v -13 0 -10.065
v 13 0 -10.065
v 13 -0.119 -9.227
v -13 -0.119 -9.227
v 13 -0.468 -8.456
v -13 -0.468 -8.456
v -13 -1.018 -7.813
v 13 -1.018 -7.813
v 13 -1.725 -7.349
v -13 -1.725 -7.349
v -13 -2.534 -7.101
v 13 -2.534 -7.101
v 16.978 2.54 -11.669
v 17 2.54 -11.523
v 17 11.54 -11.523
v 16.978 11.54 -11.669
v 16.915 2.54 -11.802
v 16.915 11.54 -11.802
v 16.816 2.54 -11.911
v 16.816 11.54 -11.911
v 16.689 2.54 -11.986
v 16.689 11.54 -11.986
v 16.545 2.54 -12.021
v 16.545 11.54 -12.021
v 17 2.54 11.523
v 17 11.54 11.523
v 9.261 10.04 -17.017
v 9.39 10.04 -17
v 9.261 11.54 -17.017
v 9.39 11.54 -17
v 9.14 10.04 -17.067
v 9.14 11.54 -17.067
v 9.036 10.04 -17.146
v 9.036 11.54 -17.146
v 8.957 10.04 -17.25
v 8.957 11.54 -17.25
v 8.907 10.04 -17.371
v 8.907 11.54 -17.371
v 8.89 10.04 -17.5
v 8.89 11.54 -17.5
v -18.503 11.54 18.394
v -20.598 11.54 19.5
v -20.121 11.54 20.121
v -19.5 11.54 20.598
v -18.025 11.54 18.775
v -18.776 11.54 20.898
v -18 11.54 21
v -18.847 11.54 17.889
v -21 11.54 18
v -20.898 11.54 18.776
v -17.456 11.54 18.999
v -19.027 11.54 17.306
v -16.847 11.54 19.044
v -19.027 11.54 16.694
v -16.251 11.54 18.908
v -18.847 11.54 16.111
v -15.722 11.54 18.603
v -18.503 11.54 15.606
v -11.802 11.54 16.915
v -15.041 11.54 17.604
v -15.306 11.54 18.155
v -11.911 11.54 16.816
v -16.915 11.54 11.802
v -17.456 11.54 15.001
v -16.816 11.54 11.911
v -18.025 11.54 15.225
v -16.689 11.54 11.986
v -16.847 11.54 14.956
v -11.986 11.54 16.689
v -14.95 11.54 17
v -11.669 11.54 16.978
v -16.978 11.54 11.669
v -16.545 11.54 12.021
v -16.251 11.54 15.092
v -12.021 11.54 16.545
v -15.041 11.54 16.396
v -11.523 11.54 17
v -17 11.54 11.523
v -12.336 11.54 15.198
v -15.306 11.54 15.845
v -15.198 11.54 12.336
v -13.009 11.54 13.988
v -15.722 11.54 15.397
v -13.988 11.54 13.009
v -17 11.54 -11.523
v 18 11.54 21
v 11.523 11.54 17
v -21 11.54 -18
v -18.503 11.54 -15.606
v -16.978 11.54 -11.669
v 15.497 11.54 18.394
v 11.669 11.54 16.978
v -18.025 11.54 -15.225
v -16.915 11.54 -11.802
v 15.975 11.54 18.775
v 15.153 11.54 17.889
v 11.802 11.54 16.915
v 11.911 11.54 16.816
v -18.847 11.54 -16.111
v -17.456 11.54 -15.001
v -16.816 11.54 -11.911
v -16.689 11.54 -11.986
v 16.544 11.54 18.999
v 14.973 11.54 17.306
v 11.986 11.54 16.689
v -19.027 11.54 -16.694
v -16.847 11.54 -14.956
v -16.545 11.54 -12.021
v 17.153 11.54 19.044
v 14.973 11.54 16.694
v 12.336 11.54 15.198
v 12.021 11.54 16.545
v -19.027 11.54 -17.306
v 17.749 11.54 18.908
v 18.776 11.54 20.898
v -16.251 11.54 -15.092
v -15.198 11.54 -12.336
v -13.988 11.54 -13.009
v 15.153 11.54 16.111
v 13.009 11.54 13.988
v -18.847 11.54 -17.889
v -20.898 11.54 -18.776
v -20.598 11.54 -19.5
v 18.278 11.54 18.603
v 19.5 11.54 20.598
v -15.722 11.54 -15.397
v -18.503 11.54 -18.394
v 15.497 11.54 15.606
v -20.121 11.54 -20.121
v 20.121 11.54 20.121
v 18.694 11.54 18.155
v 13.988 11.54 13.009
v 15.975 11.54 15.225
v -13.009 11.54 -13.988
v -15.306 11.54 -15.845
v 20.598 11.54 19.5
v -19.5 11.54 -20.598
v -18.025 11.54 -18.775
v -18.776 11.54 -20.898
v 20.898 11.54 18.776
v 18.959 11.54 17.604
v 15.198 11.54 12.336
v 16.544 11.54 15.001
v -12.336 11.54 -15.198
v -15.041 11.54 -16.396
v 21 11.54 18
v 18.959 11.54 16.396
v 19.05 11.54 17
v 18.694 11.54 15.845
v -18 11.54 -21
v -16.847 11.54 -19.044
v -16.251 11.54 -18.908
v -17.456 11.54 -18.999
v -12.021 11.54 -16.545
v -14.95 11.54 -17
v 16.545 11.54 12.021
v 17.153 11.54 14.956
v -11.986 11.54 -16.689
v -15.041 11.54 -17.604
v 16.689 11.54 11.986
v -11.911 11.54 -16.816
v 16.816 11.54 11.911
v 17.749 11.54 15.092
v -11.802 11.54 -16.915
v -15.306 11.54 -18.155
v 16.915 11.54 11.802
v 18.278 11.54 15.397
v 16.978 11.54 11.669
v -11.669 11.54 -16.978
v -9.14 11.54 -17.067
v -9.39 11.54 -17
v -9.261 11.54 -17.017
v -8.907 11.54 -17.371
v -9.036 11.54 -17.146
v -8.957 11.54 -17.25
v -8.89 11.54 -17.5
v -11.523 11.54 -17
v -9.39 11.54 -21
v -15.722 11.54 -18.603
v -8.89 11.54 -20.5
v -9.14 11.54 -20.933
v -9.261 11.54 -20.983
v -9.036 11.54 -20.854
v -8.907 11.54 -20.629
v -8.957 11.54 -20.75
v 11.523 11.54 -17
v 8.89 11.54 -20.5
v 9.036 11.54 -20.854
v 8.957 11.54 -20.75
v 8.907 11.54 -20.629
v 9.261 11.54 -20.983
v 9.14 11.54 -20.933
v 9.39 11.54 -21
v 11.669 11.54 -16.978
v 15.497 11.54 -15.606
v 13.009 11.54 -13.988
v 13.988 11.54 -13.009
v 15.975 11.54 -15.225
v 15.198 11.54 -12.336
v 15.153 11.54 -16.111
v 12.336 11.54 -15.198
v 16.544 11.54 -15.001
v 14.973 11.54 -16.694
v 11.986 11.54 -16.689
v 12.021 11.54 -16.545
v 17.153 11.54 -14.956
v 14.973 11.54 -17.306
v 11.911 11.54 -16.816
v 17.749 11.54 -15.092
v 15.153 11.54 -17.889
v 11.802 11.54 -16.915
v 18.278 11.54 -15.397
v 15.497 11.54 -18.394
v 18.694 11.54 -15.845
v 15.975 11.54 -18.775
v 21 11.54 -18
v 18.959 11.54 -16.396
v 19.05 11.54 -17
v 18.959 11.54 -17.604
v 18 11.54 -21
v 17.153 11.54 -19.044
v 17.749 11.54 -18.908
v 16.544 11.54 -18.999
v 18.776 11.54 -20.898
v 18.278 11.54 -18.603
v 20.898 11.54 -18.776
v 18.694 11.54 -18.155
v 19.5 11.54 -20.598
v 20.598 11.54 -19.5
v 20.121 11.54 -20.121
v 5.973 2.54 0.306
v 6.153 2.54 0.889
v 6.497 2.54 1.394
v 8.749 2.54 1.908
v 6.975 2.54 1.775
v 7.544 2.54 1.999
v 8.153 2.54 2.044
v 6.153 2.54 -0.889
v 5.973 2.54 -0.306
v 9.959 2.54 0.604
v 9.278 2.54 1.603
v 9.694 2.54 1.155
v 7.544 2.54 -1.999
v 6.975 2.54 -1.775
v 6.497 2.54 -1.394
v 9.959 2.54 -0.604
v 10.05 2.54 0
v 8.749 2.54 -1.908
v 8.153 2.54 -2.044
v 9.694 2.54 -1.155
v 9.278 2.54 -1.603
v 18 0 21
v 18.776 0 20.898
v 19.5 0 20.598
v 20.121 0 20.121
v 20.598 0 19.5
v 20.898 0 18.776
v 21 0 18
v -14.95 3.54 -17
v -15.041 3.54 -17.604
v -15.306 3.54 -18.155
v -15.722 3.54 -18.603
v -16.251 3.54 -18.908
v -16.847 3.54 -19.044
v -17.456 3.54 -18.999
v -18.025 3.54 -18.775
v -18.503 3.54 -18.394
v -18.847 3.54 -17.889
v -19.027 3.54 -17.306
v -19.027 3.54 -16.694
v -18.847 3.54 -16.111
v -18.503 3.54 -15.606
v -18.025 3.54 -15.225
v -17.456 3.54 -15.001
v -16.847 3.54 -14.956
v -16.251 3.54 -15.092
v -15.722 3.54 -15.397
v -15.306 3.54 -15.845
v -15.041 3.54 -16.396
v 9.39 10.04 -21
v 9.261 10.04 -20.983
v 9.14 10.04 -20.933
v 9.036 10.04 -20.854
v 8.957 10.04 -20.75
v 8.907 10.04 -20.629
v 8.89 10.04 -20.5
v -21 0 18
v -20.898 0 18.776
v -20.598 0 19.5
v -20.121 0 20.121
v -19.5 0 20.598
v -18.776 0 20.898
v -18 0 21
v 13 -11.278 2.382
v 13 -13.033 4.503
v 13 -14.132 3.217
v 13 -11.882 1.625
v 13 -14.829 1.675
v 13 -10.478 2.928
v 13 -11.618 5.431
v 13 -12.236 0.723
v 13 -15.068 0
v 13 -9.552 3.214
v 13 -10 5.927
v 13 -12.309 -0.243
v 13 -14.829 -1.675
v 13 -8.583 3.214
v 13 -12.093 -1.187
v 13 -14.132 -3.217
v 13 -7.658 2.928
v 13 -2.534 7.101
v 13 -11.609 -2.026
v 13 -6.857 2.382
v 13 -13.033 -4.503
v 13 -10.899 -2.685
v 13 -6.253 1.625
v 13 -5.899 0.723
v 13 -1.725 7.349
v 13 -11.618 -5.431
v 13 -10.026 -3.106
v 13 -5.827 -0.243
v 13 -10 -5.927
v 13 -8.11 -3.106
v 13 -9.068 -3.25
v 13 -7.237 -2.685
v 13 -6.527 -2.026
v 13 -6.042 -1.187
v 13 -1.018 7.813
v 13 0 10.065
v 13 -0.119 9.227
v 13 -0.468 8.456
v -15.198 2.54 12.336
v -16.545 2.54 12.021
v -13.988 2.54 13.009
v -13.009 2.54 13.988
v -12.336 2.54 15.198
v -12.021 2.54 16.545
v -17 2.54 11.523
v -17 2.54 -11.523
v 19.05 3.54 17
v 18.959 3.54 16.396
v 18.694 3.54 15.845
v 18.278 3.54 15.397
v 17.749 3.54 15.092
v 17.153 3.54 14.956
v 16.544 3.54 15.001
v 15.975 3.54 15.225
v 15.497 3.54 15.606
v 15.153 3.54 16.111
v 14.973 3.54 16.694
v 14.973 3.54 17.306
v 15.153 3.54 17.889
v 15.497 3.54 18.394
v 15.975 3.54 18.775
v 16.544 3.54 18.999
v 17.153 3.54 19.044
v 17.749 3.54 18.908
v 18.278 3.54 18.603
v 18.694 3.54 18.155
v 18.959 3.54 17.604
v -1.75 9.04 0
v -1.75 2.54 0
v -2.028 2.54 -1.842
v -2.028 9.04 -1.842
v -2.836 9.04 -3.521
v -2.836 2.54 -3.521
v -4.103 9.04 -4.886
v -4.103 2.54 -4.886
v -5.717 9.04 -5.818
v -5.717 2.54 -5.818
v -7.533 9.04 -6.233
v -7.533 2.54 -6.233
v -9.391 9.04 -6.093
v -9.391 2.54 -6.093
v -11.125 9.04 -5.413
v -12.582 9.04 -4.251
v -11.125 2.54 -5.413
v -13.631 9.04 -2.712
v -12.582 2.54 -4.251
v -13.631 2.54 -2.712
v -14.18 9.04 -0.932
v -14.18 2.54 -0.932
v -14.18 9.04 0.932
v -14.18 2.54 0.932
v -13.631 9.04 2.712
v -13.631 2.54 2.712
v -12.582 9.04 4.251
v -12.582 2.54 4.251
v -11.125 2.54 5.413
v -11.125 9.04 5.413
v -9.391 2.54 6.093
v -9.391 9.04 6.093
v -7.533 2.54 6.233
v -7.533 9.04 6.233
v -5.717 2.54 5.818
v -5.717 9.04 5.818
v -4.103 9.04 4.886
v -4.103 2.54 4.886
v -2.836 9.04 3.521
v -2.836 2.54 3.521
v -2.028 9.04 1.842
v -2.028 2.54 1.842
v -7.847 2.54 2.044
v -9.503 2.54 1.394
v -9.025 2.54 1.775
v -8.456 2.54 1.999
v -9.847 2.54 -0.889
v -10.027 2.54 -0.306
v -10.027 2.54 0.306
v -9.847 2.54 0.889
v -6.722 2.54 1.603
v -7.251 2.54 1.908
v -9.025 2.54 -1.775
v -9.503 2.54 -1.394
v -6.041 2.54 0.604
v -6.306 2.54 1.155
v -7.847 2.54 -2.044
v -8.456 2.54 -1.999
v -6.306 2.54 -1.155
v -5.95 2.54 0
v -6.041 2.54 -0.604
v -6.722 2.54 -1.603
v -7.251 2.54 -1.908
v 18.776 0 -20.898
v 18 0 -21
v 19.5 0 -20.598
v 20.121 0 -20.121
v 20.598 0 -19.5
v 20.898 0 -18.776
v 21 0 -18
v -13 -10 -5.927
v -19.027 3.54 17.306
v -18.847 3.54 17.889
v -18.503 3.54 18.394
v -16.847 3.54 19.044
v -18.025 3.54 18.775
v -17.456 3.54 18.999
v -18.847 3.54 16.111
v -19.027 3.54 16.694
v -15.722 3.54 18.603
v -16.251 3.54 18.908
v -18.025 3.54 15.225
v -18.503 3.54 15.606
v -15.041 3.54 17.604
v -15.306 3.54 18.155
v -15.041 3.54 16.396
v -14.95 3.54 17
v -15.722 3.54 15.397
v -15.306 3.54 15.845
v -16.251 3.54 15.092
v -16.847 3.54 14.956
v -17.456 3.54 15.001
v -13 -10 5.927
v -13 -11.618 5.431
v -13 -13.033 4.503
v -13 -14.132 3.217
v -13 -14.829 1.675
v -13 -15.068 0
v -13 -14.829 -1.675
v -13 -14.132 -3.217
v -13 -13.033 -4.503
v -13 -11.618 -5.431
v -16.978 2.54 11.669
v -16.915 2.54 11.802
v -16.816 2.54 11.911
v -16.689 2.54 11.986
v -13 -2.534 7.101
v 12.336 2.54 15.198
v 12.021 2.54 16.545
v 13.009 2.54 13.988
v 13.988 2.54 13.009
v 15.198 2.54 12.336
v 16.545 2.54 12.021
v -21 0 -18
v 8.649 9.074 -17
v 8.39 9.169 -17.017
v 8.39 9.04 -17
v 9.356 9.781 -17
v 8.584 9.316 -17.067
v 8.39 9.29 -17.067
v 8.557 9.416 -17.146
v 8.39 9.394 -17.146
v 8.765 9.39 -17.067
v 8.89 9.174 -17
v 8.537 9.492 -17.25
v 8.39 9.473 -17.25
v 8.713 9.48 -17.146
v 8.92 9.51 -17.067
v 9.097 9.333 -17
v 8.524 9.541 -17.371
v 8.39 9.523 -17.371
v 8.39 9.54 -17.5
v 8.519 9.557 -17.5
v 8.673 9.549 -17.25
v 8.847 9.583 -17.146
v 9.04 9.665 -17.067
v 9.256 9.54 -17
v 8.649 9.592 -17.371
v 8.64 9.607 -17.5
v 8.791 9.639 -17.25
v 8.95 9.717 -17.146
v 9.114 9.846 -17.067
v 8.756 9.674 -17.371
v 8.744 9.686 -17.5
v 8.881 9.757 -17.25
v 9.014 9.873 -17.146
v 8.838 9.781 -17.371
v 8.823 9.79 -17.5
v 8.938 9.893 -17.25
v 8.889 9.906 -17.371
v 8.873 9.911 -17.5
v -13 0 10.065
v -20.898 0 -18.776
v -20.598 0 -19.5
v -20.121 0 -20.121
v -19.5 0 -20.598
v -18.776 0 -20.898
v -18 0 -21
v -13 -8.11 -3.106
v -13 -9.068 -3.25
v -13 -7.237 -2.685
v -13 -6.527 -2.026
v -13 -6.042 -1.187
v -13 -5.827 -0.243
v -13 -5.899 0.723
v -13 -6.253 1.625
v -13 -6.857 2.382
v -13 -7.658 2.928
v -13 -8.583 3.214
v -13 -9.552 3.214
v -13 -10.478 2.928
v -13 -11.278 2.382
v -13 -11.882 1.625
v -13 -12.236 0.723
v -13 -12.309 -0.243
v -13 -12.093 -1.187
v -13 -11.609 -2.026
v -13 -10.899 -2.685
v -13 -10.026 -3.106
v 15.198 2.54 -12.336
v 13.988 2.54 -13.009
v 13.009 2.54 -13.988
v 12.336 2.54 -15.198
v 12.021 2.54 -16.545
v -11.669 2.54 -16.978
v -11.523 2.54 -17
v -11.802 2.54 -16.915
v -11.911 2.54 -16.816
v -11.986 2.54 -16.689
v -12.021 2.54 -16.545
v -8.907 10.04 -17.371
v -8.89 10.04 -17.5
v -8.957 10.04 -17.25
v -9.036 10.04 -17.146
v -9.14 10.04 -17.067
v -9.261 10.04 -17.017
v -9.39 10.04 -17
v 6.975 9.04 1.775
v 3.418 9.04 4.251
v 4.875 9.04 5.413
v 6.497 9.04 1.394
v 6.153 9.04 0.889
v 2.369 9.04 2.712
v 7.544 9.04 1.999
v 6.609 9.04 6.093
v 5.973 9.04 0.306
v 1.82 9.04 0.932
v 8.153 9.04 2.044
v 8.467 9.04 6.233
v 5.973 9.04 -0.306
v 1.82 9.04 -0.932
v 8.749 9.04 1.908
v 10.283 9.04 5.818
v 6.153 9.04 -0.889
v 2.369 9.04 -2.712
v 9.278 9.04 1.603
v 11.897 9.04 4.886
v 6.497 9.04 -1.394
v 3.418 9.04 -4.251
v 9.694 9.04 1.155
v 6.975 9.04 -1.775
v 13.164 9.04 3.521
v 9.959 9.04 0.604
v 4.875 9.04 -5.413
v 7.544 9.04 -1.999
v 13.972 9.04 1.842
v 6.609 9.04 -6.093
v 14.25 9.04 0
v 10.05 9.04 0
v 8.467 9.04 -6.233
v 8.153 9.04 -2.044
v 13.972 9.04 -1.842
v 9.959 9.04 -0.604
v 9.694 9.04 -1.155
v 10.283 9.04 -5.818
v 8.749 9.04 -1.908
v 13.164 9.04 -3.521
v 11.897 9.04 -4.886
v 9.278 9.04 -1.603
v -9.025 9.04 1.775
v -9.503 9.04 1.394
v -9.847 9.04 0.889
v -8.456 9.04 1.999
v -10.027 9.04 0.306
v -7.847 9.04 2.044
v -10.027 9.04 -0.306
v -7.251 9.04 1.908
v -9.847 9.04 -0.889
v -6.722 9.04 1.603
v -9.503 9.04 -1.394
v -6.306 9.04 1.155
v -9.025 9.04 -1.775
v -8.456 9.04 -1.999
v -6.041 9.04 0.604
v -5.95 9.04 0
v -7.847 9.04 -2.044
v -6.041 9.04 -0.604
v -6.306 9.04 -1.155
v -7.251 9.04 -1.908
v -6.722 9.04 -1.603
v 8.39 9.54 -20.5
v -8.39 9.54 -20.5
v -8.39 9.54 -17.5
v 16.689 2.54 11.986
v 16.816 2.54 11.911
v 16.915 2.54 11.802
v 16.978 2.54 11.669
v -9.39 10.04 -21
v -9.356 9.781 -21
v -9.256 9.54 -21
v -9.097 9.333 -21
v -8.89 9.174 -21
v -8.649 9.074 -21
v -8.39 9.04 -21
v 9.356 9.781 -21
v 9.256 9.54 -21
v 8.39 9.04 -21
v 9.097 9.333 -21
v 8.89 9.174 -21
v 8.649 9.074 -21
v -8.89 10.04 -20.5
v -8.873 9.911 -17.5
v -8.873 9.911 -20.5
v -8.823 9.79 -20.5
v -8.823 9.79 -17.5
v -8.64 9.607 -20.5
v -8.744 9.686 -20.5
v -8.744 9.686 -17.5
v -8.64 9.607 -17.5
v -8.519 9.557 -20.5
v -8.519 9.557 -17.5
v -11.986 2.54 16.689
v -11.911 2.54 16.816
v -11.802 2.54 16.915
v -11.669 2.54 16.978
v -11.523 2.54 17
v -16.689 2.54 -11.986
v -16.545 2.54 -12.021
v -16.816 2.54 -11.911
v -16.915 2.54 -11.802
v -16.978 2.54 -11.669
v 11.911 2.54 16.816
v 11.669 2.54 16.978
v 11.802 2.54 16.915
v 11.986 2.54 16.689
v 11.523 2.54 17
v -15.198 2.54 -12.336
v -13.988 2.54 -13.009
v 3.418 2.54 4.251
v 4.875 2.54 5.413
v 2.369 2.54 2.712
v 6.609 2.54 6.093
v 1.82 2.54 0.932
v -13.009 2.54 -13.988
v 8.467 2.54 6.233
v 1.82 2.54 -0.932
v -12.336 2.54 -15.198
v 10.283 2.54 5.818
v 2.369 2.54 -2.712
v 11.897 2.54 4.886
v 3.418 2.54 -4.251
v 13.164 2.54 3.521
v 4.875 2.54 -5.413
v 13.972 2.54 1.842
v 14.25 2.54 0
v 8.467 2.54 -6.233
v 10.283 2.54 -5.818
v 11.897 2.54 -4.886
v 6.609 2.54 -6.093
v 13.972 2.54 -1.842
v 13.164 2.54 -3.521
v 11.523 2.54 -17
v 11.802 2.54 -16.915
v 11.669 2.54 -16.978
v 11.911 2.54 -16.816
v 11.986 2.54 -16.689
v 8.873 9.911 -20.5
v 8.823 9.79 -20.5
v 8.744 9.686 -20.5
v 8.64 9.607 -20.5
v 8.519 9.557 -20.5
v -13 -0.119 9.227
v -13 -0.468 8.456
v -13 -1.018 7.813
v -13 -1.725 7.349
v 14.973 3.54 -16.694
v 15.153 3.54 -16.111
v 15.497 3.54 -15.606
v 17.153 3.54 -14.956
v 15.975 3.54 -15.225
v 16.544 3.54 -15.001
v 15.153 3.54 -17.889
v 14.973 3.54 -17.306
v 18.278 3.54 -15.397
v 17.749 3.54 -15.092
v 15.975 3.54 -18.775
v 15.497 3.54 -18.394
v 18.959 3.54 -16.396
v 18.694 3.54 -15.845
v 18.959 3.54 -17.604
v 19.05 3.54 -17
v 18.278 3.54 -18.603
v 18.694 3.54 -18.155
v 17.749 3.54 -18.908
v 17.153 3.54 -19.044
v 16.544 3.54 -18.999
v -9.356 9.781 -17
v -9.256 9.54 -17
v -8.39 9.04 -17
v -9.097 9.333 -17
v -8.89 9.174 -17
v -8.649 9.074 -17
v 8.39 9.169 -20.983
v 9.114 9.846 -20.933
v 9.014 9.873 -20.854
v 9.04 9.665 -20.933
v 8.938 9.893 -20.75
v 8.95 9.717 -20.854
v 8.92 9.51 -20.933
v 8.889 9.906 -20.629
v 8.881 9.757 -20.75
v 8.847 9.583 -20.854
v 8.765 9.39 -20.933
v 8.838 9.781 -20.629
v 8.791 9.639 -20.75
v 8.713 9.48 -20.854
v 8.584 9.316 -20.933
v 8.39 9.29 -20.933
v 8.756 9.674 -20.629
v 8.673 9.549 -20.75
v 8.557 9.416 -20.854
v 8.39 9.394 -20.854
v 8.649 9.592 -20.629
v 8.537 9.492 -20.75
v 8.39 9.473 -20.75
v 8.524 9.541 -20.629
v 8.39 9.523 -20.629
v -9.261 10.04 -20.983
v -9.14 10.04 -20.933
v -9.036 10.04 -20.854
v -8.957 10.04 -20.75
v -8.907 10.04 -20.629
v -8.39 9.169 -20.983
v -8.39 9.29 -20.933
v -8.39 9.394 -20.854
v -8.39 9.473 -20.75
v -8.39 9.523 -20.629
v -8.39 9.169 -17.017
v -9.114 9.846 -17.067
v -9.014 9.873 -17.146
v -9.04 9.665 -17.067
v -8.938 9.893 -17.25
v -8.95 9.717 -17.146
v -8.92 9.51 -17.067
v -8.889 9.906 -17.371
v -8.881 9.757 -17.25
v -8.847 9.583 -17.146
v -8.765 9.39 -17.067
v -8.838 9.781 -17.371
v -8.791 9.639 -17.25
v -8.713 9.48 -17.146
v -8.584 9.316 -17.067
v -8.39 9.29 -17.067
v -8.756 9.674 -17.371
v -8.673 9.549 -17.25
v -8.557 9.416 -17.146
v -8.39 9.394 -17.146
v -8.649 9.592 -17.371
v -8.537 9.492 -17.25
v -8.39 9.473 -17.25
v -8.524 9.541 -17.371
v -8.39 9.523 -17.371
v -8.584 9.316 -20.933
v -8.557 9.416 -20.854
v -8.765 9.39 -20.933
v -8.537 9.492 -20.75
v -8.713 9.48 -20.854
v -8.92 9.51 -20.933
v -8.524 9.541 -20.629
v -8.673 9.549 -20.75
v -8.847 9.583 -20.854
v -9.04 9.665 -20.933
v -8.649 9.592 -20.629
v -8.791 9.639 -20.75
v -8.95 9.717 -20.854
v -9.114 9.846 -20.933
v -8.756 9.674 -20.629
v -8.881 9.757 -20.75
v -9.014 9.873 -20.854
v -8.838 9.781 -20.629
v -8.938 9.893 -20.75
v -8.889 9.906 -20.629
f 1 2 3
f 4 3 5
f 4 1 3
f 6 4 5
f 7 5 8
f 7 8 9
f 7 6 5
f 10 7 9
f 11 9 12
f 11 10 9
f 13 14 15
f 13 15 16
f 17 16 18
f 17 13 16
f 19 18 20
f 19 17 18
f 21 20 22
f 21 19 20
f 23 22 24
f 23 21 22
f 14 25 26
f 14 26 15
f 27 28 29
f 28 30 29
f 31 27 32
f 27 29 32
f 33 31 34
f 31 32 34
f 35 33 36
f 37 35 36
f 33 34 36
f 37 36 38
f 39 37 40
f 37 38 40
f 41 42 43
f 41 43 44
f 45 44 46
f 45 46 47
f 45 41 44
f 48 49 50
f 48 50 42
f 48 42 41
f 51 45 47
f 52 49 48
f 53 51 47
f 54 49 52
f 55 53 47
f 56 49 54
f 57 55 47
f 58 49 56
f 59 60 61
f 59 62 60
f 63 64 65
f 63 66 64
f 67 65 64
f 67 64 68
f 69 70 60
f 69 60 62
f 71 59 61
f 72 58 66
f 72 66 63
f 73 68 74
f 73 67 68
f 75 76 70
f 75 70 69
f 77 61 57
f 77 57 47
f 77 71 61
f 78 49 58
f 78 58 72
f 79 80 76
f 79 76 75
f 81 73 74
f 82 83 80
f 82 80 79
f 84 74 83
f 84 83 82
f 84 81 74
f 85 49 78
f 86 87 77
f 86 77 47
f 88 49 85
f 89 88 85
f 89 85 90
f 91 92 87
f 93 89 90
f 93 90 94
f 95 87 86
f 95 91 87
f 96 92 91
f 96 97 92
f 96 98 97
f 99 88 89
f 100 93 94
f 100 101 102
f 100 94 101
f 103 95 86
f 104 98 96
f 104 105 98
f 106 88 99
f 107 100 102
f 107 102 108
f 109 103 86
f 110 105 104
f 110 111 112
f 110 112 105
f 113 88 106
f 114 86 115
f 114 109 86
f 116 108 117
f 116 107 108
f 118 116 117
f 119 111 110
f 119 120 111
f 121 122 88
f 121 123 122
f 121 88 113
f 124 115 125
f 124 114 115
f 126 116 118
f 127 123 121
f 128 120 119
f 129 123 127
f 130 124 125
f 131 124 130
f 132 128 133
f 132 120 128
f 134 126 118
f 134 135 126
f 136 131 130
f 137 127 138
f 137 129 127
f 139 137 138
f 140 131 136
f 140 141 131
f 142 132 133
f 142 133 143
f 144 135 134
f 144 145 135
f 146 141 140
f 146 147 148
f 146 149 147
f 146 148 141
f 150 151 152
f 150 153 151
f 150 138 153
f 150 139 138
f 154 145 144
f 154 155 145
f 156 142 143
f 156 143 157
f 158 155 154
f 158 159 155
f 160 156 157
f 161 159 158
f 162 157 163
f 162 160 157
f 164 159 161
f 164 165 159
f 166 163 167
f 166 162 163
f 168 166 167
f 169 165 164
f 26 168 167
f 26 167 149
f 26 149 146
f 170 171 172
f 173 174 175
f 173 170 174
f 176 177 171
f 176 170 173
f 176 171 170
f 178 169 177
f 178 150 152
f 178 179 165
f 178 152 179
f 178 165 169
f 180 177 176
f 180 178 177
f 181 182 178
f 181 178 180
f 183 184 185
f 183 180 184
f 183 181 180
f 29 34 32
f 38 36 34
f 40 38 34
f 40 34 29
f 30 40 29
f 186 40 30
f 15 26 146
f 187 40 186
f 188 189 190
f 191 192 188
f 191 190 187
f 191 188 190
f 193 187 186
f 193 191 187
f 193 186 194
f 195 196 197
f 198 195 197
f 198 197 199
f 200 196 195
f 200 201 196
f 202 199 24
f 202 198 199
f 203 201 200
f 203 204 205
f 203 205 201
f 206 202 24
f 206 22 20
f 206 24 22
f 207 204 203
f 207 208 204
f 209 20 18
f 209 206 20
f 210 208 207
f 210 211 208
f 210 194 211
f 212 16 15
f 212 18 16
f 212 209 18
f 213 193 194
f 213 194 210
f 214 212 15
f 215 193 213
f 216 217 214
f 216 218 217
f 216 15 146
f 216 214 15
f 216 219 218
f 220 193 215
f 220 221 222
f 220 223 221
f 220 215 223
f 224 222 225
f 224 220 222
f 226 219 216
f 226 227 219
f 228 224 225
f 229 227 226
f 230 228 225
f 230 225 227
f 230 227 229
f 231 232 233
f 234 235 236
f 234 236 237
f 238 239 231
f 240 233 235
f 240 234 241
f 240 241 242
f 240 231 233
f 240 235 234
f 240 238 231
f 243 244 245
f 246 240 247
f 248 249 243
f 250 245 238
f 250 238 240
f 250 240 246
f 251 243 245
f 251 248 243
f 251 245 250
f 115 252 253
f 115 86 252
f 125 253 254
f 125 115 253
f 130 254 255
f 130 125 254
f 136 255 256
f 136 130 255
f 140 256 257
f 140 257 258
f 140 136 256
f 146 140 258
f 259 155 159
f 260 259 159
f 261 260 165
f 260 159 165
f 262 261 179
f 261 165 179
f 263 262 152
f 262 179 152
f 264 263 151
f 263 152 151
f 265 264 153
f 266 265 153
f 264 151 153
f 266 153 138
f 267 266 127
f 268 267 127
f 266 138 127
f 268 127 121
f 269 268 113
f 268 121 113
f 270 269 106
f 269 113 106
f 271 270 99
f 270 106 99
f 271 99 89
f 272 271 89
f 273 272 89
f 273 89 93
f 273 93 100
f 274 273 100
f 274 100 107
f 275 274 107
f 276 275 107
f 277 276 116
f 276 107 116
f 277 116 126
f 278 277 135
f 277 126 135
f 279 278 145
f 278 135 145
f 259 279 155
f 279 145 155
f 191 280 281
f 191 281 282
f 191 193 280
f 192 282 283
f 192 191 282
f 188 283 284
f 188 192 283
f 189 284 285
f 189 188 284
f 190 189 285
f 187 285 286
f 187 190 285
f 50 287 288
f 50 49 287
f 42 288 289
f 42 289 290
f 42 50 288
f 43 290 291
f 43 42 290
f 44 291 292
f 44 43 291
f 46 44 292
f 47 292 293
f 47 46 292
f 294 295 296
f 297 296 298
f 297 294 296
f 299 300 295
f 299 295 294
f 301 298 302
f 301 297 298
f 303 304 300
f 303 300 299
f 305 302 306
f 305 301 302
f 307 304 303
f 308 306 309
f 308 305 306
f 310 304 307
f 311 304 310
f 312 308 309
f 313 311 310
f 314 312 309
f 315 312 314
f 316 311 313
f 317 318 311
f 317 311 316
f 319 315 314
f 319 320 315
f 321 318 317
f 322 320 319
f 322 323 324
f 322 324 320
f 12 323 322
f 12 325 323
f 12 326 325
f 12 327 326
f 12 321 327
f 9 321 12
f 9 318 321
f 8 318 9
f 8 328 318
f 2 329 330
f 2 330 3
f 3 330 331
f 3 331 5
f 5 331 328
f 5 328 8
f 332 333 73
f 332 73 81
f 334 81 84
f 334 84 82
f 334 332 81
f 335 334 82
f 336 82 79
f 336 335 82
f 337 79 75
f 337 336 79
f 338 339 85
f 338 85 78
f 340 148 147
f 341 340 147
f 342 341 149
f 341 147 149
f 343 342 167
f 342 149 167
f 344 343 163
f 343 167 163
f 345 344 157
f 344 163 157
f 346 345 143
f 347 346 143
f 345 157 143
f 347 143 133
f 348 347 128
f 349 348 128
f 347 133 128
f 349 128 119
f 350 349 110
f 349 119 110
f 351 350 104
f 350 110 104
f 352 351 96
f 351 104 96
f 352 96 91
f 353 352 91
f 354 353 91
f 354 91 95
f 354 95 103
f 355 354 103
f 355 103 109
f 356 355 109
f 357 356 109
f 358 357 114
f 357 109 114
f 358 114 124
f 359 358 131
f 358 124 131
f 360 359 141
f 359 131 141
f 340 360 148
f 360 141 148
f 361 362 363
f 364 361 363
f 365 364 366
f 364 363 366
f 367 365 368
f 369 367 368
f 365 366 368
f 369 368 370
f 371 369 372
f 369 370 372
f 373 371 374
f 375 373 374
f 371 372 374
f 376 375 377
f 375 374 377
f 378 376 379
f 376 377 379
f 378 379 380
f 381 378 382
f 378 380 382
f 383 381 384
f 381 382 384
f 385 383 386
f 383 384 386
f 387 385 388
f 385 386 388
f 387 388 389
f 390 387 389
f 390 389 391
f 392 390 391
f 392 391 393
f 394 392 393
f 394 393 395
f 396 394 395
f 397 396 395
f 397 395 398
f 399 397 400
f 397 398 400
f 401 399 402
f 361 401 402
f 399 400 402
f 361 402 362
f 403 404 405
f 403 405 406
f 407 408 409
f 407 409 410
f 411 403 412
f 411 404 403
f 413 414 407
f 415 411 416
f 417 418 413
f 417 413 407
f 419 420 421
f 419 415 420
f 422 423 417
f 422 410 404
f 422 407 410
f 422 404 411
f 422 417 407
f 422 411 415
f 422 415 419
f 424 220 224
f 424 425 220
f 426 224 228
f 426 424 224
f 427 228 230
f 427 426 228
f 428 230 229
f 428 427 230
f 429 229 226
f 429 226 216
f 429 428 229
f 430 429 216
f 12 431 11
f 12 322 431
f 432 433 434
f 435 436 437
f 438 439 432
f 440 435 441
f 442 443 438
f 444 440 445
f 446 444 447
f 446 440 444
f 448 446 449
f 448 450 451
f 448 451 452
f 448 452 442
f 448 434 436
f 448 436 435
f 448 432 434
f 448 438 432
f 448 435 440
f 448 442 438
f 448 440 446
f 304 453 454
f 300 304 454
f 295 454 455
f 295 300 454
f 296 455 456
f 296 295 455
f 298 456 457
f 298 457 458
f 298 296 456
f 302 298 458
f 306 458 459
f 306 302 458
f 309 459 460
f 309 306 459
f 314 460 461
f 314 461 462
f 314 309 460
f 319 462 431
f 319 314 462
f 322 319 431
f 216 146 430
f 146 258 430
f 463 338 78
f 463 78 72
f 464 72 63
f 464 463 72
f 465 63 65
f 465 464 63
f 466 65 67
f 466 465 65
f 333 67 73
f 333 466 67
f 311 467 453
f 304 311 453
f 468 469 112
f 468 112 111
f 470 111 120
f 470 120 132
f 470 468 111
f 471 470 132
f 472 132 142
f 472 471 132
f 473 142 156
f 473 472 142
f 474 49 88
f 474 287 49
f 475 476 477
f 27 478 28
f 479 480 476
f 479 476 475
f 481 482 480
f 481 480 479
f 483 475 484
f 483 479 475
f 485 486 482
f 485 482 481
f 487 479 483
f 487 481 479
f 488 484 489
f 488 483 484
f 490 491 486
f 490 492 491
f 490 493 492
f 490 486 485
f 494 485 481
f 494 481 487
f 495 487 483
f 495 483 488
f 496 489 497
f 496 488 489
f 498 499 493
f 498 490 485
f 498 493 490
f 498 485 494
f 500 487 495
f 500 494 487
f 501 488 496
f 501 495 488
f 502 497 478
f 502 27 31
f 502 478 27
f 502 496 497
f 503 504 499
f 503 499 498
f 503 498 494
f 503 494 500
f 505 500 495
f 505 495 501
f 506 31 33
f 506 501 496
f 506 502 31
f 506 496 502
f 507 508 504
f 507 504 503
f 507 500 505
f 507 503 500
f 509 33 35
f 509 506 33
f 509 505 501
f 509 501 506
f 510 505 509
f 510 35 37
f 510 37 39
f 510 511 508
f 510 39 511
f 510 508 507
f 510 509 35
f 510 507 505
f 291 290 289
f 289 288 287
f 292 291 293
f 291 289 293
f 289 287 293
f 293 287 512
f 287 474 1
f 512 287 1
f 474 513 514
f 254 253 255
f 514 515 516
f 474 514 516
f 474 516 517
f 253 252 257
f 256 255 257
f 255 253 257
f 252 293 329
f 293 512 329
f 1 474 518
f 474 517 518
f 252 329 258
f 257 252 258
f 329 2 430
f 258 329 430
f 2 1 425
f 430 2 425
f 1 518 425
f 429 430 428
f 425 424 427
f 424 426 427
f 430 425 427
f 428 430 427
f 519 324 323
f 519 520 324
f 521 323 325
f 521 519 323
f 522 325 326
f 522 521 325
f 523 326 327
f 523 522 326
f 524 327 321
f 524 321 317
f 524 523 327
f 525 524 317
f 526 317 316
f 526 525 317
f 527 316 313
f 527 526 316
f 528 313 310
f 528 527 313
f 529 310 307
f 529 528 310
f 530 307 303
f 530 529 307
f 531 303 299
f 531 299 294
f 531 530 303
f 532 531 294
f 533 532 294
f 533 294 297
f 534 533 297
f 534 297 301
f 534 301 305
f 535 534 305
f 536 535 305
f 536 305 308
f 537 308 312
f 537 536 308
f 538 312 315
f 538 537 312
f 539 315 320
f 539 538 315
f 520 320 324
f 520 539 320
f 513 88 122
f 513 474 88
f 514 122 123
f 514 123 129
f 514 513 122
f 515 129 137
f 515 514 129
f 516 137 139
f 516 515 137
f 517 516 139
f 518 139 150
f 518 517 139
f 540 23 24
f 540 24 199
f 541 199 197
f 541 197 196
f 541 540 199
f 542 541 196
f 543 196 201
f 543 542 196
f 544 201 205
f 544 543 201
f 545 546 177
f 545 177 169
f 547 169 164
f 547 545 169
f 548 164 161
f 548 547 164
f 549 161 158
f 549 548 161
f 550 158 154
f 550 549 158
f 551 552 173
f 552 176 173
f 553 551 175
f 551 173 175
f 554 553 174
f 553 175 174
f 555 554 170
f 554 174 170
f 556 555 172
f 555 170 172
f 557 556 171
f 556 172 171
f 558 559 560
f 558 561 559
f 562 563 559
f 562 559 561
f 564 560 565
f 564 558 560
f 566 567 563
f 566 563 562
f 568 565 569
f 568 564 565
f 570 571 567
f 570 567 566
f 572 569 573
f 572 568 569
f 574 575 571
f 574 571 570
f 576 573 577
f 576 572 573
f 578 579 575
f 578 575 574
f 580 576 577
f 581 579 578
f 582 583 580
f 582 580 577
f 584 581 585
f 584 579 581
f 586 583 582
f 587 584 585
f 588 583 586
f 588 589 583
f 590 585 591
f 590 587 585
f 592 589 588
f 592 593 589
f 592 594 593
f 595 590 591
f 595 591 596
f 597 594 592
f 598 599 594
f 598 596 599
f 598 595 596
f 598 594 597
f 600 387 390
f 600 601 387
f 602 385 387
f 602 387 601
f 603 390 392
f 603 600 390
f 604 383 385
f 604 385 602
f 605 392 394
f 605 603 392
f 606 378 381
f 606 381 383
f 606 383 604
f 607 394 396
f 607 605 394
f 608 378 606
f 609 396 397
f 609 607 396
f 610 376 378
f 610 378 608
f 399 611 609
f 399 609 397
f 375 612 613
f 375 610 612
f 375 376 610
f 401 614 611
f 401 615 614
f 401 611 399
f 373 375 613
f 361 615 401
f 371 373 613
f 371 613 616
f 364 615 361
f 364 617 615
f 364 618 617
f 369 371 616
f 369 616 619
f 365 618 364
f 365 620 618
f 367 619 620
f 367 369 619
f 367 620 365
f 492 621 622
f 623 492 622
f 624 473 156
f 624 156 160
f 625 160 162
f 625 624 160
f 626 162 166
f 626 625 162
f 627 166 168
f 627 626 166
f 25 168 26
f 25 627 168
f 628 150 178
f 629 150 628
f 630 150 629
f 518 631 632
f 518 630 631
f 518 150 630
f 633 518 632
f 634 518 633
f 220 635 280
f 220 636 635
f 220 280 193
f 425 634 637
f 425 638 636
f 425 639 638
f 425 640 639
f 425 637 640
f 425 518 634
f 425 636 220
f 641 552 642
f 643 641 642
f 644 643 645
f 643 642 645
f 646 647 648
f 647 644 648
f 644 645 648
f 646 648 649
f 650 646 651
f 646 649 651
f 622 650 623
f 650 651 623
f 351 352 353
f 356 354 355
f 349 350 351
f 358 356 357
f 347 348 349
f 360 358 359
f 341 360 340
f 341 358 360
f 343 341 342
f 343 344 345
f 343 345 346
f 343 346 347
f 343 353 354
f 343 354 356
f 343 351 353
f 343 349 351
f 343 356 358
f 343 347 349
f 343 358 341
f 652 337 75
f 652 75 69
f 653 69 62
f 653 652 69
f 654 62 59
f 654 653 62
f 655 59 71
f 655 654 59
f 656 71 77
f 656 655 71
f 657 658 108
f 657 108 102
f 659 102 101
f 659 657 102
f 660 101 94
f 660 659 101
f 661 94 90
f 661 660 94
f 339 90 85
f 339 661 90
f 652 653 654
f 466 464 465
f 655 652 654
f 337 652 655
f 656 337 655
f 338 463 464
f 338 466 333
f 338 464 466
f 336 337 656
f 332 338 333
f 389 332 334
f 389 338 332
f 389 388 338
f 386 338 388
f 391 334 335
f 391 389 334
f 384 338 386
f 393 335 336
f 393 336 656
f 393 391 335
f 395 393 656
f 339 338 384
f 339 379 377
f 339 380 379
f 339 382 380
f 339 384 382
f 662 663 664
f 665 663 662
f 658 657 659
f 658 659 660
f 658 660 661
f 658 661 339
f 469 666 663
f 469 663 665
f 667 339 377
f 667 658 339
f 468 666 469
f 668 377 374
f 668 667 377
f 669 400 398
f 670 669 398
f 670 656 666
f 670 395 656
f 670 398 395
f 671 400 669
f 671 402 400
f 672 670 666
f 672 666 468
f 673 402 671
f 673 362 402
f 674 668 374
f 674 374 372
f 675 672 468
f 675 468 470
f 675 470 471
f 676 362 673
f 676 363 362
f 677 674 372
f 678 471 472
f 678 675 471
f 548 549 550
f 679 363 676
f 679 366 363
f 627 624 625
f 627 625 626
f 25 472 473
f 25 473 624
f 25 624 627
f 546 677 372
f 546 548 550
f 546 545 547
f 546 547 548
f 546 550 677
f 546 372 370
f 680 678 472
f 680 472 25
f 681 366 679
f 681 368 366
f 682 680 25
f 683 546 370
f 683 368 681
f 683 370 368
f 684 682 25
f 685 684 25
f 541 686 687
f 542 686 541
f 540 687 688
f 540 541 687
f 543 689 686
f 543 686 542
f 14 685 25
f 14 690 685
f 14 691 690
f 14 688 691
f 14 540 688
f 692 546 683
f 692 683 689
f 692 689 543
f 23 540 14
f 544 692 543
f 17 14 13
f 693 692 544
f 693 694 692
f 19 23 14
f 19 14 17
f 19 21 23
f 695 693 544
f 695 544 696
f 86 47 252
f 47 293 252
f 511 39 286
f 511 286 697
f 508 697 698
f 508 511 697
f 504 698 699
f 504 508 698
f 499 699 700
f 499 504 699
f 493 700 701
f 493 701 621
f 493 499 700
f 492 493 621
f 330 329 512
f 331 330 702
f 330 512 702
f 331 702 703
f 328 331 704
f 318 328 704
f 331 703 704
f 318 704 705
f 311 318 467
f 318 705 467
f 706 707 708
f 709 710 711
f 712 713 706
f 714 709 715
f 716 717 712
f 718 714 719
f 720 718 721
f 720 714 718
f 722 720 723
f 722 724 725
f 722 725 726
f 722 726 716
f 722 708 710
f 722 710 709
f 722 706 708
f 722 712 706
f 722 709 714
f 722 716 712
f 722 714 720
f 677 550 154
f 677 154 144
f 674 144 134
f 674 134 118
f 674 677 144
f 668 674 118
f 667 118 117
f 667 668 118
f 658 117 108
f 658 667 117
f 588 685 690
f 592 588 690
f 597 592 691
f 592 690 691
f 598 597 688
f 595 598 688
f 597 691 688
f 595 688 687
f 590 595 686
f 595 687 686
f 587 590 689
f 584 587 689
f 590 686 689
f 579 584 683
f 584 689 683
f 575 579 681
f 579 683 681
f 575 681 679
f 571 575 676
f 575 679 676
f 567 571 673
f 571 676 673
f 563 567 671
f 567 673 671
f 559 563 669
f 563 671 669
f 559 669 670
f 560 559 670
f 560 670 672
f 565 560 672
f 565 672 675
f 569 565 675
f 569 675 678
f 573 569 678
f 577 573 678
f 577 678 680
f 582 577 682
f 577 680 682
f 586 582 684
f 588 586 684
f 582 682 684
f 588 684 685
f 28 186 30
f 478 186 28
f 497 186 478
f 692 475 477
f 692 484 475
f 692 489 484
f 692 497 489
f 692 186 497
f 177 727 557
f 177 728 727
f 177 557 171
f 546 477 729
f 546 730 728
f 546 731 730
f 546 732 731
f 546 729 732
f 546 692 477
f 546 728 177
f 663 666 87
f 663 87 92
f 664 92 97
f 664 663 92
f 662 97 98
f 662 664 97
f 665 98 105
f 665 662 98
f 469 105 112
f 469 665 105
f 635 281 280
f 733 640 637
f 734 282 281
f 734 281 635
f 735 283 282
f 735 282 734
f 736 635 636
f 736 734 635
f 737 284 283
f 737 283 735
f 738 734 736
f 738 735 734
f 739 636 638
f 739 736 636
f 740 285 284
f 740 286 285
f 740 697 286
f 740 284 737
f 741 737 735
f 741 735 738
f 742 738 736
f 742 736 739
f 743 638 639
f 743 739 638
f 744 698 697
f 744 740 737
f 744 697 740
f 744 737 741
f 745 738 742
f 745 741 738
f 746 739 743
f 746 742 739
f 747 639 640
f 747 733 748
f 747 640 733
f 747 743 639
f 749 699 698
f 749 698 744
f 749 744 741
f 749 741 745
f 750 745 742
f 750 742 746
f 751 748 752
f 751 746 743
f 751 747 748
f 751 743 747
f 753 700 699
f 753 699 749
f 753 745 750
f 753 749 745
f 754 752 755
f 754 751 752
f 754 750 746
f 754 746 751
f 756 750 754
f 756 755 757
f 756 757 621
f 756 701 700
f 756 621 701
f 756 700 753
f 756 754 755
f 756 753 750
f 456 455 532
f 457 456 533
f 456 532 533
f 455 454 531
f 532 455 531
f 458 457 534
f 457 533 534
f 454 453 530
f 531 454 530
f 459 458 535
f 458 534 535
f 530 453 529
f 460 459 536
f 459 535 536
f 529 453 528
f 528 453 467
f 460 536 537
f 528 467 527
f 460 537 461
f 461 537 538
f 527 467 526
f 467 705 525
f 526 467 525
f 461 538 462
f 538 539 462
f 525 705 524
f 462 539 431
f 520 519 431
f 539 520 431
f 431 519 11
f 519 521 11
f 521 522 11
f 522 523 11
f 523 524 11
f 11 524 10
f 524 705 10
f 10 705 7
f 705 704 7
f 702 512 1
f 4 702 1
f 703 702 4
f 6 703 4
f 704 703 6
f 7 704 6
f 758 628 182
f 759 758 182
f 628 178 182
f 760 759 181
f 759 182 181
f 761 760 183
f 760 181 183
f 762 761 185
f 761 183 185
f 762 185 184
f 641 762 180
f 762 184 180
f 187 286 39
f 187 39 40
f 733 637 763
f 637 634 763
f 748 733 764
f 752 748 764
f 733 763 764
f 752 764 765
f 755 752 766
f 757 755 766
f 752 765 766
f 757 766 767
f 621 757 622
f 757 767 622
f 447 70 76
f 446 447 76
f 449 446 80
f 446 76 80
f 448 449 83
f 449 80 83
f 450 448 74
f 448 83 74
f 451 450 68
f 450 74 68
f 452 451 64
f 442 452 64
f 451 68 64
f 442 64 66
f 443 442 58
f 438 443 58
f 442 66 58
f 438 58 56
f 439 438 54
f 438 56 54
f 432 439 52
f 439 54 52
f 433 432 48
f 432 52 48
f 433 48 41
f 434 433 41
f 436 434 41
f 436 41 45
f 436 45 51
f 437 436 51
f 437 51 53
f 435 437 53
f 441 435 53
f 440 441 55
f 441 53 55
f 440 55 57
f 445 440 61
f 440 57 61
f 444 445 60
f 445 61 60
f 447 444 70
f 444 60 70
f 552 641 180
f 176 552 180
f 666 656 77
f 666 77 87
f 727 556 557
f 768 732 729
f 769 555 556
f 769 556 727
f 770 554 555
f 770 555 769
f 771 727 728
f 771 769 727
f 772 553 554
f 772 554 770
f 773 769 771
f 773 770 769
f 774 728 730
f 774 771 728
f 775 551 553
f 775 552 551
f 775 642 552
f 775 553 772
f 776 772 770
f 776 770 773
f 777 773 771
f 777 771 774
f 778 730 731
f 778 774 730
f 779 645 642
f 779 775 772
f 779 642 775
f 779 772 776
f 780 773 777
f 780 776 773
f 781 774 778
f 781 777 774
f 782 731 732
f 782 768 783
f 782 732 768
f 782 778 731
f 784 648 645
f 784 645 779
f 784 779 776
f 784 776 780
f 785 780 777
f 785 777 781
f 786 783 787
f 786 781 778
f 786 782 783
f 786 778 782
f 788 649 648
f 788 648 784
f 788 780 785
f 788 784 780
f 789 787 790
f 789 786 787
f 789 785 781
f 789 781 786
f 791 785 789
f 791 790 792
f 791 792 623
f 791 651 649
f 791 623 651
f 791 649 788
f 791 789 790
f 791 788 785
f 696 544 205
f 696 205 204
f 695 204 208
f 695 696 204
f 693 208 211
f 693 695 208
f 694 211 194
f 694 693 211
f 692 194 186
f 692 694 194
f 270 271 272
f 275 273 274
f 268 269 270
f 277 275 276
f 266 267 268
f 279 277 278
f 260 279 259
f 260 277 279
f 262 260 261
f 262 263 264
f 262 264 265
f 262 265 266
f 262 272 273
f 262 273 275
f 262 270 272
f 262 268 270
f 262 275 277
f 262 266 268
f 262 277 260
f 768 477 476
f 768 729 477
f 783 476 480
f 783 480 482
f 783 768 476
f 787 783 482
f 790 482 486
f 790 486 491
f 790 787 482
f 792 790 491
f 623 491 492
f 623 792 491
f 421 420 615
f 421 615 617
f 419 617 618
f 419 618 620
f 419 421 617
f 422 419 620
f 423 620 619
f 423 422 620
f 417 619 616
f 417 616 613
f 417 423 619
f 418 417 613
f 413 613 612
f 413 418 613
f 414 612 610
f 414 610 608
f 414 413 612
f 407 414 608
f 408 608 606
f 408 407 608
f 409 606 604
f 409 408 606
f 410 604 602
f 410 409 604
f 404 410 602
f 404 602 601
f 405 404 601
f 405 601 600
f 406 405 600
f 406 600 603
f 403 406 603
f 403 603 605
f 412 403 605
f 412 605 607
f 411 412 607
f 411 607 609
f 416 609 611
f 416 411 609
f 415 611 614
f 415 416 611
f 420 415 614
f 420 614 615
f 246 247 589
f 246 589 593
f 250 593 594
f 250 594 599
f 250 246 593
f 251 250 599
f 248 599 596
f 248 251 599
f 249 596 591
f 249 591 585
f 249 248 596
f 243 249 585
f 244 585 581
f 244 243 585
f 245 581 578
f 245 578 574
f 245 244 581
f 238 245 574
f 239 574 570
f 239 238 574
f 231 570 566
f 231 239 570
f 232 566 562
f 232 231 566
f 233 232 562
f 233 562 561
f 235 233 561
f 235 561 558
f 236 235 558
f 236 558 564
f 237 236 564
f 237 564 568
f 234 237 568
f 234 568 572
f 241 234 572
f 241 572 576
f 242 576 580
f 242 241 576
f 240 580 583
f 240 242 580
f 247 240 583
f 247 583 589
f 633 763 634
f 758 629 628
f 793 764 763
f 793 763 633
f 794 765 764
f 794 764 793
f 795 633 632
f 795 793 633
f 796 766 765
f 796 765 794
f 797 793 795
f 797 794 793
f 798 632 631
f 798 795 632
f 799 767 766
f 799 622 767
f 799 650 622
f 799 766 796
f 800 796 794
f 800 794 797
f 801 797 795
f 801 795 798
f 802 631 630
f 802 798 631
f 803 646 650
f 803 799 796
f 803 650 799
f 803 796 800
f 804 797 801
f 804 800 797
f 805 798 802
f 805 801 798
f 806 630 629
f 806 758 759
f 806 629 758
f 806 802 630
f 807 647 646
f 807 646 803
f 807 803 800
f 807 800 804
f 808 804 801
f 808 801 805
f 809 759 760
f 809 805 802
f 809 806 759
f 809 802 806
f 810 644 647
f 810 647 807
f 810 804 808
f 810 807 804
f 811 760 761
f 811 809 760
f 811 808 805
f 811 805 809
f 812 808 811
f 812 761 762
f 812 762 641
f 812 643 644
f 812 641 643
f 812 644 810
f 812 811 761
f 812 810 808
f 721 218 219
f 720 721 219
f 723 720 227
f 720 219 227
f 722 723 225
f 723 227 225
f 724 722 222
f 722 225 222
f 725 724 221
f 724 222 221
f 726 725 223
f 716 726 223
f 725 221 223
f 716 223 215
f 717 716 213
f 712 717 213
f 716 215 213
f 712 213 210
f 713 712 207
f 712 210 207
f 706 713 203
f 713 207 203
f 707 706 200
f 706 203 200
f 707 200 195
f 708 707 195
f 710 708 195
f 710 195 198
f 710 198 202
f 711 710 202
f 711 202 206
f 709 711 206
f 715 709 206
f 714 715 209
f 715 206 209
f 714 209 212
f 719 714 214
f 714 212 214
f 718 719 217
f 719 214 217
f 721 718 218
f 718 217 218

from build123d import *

# Parameters (mm, degrees)
SKETCH1_W           = 42
SKETCH1_H           = 42
BOSS_EXTRUDE1_DEPTH = 2.54
SKETCH2_W           = 42
SKETCH2_H           = 42
BOSS_EXTRUDE2_DEPTH = 9
SKETCH13_R          = 3.25
BOSS_EXTRUDE6_DEPTH = 13
SKETCH9_R           = 6.25
SKETCH9_R_2         = 2.05
BOSS_EXTRUDE5_DEPTH = 6.5
SKETCH10_R          = 2.05
CUT_EXTRUDE1_DEPTH  = 8
SKETCH12_W          = 17.78
SKETCH12_H          = 2
CUT_EXTRUDE2_DEPTH  = 4
FILLET1_R           = 3
FILLET2_R           = 0.5
FILLET3_R           = 3


with BuildPart() as part:
    # Sketch1 → Boss-Extrude1 (new body)
    with BuildSketch(Plane(origin=(0, 0, 0), x_dir=(1, 0, 0), z_dir=(0, 1, 0))):
        Rectangle(SKETCH1_W, SKETCH1_H)
    extrude(amount=BOSS_EXTRUDE1_DEPTH)

    # Sketch2 → Boss-Extrude2 (add)
    with BuildSketch(Plane(origin=(0, 2.54, 0), x_dir=(1, 0, 0), z_dir=(0, 1, 0))):
        Rectangle(SKETCH2_W, SKETCH2_H)
        with BuildLine():
            Line((-17, 11.522774425), (-17, -11.522774425))
            ThreePointArc((-17, -11.522774425), (-16.869274473, -11.859874356), (-16.545454545, -12.020704023))
            ThreePointArc((-16.545454545, -12.020704023), (-13.464466094, -13.464466094), (-12.020704023, -16.545454545))
            ThreePointArc((-12.020704023, -16.545454545), (-11.859874356, -16.869274473), (-11.522774425, -17))
            Line((-11.522774425, -17), (11.522774425, -17))
            ThreePointArc((11.522774425, -17), (11.859874356, -16.869274473), (12.020704023, -16.545454545))
            ThreePointArc((12.020704023, -16.545454545), (13.464466094, -13.464466094), (16.545454545, -12.020704023))
            ThreePointArc((16.545454545, -12.020704023), (16.869274473, -11.859874356), (17, -11.522774425))
            Line((17, -11.522774425), (17, 11.522774425))
            ThreePointArc((17, 11.522774425), (16.869274473, 11.859874356), (16.545454545, 12.020704023))
            ThreePointArc((16.545454545, 12.020704023), (13.464466094, 13.464466094), (12.020704023, 16.545454545))
            ThreePointArc((12.020704023, 16.545454545), (11.859874356, 16.869274473), (11.522774425, 17))
            Line((11.522774425, 17), (-11.522774425, 17))
            ThreePointArc((-11.522774425, 17), (-11.859874356, 16.869274473), (-12.020704023, 16.545454545))
            ThreePointArc((-12.020704023, 16.545454545), (-13.464466094, 13.464466094), (-16.545454545, 12.020704023))
            ThreePointArc((-16.545454545, 12.020704023), (-16.869274473, 11.859874356), (-17, 11.522774425))
        make_face(mode=Mode.SUBTRACT)
    extrude(amount=BOSS_EXTRUDE2_DEPTH)

    # Sketch13 → Boss-Extrude6 (add, symmetric)
    with BuildSketch(Plane(origin=(0, 0, 0), x_dir=(0, 0, -1), z_dir=(1, 0, 0))):
        with BuildLine():
            Line((-7.5, 0), (-5.927131841, -10))
            ThreePointArc((-5.927131841, -10), (0, -15.067740305), (5.927131841, -10))
            Line((5.927131841, -10), (7.5, 0))
            Line((7.5, 0), (-7.5, 0))
        make_face()
        with Locations((0, -9.067740305)):
            Circle(SKETCH13_R, mode=Mode.SUBTRACT)
    extrude(amount=BOSS_EXTRUDE6_DEPTH, both=True)

    # Sketch9 → Boss-Extrude5 (add)
    with BuildSketch(Plane(origin=(0, 2.54, 0), x_dir=(1, 0, 0), z_dir=(0, 1, 0))):
        with Locations((8, 0)):
            Circle(SKETCH9_R)
        with Locations((8, 0)):
            Circle(SKETCH9_R_2, mode=Mode.SUBTRACT)
        with Locations((-8, 0)):
            Circle(SKETCH9_R)
        with Locations((-8, 0)):
            Circle(SKETCH9_R_2, mode=Mode.SUBTRACT)
    extrude(amount=BOSS_EXTRUDE5_DEPTH)

    # Sketch10 → Cut-Extrude1 (cut)
    with BuildSketch(Plane(origin=(0, 11.54, 0), x_dir=(1, 0, 0), z_dir=(0, 1, 0))):
        with Locations((-17, 17)):
            Circle(SKETCH10_R)
        with Locations((17, 17)):
            Circle(SKETCH10_R)
        with Locations((-17, -17)):
            Circle(SKETCH10_R)
        with Locations((17, -17)):
            Circle(SKETCH10_R)
    extrude(amount=-CUT_EXTRUDE1_DEPTH, mode=Mode.SUBTRACT)

    # Sketch12 → Cut-Extrude2 (cut)
    with BuildSketch(Plane(origin=(0, 0, -21), x_dir=(-1, 0, 0), z_dir=(0, 0, -1))):
        with Locations((0, 10.54)):
            Rectangle(SKETCH12_W, SKETCH12_H)
    extrude(amount=-CUT_EXTRUDE2_DEPTH, mode=Mode.SUBTRACT)

    # Fillet1
    fillet1_edges = [part.edges().sort_by_distance(p)[0] for p in [
        (21, 5.77, 21),
        (-21, 5.77, 21),
        (-21, 5.77, -21),
        (21, 5.77, -21),
    ]]
    fillet(fillet1_edges, radius=FILLET1_R)

    # Fillet2
    fillet2_edges = [part.edges().sort_by_distance(p)[0] for p in [
        (8.89, 10.54, -21),
        (0, 9.54, -21),
        (-8.89, 10.54, -21),
        (0, 9.54, -17),
        (-8.89, 9.54, -19),
        (-8.89, 10.54, -17),
        (8.89, 10.54, -17),
        (8.89, 9.54, -19),
    ]]
    fillet(fillet2_edges, radius=FILLET2_R)

    # Fillet3
    fillet3_edges = [part.edges().sort_by_distance(p)[0] for p in [
        (0, 0, -7.5),
        (0, 0, 7.5),
    ]]
    fillet(fillet3_edges, radius=FILLET3_R)


solid = part.part
